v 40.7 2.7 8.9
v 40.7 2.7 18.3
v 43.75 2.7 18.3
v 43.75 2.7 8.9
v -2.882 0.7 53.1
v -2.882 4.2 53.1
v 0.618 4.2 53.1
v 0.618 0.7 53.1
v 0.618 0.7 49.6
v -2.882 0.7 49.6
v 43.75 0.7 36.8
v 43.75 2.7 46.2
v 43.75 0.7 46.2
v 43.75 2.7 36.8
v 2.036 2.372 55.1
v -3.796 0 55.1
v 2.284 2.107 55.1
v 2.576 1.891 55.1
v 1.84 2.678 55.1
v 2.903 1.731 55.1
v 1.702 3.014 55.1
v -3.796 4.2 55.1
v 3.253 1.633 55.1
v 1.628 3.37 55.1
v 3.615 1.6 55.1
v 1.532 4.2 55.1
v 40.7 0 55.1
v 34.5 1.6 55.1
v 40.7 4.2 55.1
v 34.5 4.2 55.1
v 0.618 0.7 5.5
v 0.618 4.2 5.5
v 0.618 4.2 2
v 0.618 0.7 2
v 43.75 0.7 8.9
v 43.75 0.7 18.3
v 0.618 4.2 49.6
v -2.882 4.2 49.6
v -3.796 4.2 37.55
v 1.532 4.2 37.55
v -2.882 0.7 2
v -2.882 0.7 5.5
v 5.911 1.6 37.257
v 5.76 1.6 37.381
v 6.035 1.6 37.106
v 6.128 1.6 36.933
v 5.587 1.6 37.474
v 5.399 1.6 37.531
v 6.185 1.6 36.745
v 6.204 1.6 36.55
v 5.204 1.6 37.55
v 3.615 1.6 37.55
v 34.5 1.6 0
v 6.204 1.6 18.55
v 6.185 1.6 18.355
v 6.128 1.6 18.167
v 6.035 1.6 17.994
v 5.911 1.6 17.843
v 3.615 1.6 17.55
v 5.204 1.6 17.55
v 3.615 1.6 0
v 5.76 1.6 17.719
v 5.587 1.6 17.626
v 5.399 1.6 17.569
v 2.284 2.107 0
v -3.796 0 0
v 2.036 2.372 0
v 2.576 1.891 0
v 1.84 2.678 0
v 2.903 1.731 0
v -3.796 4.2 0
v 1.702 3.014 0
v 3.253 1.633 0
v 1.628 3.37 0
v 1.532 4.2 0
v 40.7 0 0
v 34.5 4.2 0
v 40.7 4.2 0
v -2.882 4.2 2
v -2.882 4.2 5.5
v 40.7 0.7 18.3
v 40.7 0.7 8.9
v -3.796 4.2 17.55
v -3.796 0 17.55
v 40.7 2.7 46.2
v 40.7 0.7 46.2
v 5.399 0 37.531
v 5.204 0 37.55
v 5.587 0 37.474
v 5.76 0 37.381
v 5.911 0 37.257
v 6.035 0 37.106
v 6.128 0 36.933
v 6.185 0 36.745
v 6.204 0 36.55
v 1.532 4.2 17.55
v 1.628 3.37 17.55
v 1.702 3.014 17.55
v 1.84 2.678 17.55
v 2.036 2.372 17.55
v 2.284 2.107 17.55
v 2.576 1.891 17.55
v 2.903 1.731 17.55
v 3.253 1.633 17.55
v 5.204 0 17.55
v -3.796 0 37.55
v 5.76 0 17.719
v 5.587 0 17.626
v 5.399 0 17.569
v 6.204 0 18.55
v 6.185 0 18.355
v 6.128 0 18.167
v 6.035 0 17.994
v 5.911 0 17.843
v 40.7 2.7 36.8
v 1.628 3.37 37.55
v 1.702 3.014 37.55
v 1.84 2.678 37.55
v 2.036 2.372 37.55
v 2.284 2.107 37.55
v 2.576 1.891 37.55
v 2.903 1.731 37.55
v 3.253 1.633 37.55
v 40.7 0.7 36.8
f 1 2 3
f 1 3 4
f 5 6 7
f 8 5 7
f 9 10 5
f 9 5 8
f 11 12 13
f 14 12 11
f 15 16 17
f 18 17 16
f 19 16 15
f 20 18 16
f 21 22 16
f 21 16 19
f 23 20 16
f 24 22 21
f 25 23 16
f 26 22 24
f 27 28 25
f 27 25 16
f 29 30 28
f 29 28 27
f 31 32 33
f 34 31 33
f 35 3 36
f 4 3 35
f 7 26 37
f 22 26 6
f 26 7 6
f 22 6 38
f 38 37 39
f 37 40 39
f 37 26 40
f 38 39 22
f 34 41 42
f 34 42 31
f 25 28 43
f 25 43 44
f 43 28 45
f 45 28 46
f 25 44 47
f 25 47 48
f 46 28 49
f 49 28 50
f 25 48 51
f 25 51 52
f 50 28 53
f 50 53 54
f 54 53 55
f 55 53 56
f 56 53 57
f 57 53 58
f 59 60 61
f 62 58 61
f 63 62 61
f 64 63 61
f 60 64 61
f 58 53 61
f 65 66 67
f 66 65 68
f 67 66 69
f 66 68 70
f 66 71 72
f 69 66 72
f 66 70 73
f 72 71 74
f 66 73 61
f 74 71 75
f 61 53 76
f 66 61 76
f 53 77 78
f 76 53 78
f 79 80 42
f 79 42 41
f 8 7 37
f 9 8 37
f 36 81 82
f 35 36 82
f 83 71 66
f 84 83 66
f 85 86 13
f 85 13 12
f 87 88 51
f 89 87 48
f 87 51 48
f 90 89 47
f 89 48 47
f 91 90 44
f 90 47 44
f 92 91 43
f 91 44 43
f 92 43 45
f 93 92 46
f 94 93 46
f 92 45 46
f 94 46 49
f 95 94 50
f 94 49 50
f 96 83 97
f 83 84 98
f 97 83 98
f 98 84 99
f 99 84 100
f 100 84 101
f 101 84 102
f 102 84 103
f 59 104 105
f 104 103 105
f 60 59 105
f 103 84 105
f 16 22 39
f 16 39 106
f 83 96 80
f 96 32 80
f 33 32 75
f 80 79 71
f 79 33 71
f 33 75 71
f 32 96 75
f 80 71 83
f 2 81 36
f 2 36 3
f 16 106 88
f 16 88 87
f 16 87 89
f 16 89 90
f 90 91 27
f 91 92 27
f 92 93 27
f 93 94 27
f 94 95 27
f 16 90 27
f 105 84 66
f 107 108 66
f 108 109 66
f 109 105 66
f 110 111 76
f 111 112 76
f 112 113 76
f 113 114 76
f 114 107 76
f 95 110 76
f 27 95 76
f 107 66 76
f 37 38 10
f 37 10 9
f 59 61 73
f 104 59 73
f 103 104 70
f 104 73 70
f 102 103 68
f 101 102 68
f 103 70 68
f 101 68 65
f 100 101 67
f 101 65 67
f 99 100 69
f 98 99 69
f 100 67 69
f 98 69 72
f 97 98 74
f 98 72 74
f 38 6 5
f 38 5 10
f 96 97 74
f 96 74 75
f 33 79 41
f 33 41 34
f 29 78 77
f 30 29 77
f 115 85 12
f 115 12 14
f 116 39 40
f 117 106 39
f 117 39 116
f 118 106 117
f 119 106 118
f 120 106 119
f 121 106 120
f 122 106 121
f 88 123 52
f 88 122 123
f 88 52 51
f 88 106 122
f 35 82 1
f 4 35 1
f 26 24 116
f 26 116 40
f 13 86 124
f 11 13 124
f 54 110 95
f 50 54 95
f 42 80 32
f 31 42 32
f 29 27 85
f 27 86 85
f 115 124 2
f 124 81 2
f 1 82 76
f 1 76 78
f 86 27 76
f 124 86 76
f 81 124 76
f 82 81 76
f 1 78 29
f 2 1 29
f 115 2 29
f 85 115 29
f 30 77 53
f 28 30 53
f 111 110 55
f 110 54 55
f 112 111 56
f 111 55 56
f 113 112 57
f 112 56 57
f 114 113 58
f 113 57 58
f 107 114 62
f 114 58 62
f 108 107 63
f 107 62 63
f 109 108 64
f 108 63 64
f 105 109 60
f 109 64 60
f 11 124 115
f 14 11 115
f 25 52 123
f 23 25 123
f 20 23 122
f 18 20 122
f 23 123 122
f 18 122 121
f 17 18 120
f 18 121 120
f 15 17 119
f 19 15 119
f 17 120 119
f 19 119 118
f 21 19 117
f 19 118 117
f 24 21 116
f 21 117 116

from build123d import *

# Parameters (mm, degrees)
RESSALTO_EXTRUS_O1_DEPTH = 55.1
ESBO_O5_W                = 9.4
ESBO_O5_H                = 2
RESSALTO_EXTRUS_O2_DEPTH = 3.05
ESBO_O8_W                = 3.5
ESBO_O8_H                = 3.5
CORTE_EXTRUS_O6_DEPTH    = 3.5
ESBO_O9_W                = 10
ESBO_O9_H                = 20
CORTE_EXTRUS_O7_DEPTH    = 71.482001249
FILETE1_R                = 1


with BuildPart() as part:
    # Esboço1 → Ressalto-extrusão1 (new body)
    with BuildSketch(Plane.XY):
        with BuildLine():
            Line((0, 0), (40.7, 0))
            Line((40.7, 0), (40.7, 4.2))
            Line((40.7, 4.2), (34.5, 4.2))
            Line((34.5, 4.2), (34.5, 1.6))
            Line((34.5, 1.6), (3.614566097, 1.6))
            ThreePointArc((3.614566097, 1.6), (2.284269322, 2.106577592), (1.627871083, 3.369689511))
            Line((1.627871083, 3.369689511), (1.531616141, 4.2))
            Line((1.531616141, 4.2), (-3.796013859, 4.2))
            Line((-3.796013859, 4.2), (-3.796013859, 0))
            Line((-3.796013859, 0), (0, 0))
        make_face()
    extrude(amount=RESSALTO_EXTRUS_O1_DEPTH)

    # Esboço5 → Ressalto-extrusão2 (add)
    with BuildSketch(Plane(origin=(40.7, 0, 0), x_dir=(0, 0, -1), z_dir=(1, 0, 0))):
        with Locations((-13.6, 1.7)):
            Rectangle(ESBO_O5_W, ESBO_O5_H)
        with Locations((-41.5, 1.7)):
            Rectangle(ESBO_O5_W, ESBO_O5_H)
    extrude(amount=RESSALTO_EXTRUS_O2_DEPTH)

    # Esboço8 → Corte-extrusão6 (cut)
    with BuildSketch(Plane(origin=(0, 4.2, 0), x_dir=(1, 0, 0), z_dir=(0, 1, 0))):
        with Locations((-1.132198859, -51.35)):
            Rectangle(ESBO_O8_W, ESBO_O8_H)
        with Locations((-1.132198859, -3.75)):
            Rectangle(ESBO_O8_W, ESBO_O8_H)
    extrude(amount=-CORTE_EXTRUS_O6_DEPTH, mode=Mode.SUBTRACT)

    # Esboço9 → Corte-extrusão7 (cut, through all)
    with BuildSketch(Plane.XZ):
        with Locations((1.203986141, 27.55)):
            Rectangle(ESBO_O9_W, ESBO_O9_H)
    extrude(amount=-CORTE_EXTRUS_O7_DEPTH, mode=Mode.SUBTRACT)

    # Filete1
    filete1_edges = [part.edges().sort_by_distance(p)[0] for p in [
        (6.203986141, 0.8, 37.55),
        (6.203986141, 0.8, 17.55),
    ]]
    fillet(filete1_edges, radius=FILETE1_R)


solid = part.part
